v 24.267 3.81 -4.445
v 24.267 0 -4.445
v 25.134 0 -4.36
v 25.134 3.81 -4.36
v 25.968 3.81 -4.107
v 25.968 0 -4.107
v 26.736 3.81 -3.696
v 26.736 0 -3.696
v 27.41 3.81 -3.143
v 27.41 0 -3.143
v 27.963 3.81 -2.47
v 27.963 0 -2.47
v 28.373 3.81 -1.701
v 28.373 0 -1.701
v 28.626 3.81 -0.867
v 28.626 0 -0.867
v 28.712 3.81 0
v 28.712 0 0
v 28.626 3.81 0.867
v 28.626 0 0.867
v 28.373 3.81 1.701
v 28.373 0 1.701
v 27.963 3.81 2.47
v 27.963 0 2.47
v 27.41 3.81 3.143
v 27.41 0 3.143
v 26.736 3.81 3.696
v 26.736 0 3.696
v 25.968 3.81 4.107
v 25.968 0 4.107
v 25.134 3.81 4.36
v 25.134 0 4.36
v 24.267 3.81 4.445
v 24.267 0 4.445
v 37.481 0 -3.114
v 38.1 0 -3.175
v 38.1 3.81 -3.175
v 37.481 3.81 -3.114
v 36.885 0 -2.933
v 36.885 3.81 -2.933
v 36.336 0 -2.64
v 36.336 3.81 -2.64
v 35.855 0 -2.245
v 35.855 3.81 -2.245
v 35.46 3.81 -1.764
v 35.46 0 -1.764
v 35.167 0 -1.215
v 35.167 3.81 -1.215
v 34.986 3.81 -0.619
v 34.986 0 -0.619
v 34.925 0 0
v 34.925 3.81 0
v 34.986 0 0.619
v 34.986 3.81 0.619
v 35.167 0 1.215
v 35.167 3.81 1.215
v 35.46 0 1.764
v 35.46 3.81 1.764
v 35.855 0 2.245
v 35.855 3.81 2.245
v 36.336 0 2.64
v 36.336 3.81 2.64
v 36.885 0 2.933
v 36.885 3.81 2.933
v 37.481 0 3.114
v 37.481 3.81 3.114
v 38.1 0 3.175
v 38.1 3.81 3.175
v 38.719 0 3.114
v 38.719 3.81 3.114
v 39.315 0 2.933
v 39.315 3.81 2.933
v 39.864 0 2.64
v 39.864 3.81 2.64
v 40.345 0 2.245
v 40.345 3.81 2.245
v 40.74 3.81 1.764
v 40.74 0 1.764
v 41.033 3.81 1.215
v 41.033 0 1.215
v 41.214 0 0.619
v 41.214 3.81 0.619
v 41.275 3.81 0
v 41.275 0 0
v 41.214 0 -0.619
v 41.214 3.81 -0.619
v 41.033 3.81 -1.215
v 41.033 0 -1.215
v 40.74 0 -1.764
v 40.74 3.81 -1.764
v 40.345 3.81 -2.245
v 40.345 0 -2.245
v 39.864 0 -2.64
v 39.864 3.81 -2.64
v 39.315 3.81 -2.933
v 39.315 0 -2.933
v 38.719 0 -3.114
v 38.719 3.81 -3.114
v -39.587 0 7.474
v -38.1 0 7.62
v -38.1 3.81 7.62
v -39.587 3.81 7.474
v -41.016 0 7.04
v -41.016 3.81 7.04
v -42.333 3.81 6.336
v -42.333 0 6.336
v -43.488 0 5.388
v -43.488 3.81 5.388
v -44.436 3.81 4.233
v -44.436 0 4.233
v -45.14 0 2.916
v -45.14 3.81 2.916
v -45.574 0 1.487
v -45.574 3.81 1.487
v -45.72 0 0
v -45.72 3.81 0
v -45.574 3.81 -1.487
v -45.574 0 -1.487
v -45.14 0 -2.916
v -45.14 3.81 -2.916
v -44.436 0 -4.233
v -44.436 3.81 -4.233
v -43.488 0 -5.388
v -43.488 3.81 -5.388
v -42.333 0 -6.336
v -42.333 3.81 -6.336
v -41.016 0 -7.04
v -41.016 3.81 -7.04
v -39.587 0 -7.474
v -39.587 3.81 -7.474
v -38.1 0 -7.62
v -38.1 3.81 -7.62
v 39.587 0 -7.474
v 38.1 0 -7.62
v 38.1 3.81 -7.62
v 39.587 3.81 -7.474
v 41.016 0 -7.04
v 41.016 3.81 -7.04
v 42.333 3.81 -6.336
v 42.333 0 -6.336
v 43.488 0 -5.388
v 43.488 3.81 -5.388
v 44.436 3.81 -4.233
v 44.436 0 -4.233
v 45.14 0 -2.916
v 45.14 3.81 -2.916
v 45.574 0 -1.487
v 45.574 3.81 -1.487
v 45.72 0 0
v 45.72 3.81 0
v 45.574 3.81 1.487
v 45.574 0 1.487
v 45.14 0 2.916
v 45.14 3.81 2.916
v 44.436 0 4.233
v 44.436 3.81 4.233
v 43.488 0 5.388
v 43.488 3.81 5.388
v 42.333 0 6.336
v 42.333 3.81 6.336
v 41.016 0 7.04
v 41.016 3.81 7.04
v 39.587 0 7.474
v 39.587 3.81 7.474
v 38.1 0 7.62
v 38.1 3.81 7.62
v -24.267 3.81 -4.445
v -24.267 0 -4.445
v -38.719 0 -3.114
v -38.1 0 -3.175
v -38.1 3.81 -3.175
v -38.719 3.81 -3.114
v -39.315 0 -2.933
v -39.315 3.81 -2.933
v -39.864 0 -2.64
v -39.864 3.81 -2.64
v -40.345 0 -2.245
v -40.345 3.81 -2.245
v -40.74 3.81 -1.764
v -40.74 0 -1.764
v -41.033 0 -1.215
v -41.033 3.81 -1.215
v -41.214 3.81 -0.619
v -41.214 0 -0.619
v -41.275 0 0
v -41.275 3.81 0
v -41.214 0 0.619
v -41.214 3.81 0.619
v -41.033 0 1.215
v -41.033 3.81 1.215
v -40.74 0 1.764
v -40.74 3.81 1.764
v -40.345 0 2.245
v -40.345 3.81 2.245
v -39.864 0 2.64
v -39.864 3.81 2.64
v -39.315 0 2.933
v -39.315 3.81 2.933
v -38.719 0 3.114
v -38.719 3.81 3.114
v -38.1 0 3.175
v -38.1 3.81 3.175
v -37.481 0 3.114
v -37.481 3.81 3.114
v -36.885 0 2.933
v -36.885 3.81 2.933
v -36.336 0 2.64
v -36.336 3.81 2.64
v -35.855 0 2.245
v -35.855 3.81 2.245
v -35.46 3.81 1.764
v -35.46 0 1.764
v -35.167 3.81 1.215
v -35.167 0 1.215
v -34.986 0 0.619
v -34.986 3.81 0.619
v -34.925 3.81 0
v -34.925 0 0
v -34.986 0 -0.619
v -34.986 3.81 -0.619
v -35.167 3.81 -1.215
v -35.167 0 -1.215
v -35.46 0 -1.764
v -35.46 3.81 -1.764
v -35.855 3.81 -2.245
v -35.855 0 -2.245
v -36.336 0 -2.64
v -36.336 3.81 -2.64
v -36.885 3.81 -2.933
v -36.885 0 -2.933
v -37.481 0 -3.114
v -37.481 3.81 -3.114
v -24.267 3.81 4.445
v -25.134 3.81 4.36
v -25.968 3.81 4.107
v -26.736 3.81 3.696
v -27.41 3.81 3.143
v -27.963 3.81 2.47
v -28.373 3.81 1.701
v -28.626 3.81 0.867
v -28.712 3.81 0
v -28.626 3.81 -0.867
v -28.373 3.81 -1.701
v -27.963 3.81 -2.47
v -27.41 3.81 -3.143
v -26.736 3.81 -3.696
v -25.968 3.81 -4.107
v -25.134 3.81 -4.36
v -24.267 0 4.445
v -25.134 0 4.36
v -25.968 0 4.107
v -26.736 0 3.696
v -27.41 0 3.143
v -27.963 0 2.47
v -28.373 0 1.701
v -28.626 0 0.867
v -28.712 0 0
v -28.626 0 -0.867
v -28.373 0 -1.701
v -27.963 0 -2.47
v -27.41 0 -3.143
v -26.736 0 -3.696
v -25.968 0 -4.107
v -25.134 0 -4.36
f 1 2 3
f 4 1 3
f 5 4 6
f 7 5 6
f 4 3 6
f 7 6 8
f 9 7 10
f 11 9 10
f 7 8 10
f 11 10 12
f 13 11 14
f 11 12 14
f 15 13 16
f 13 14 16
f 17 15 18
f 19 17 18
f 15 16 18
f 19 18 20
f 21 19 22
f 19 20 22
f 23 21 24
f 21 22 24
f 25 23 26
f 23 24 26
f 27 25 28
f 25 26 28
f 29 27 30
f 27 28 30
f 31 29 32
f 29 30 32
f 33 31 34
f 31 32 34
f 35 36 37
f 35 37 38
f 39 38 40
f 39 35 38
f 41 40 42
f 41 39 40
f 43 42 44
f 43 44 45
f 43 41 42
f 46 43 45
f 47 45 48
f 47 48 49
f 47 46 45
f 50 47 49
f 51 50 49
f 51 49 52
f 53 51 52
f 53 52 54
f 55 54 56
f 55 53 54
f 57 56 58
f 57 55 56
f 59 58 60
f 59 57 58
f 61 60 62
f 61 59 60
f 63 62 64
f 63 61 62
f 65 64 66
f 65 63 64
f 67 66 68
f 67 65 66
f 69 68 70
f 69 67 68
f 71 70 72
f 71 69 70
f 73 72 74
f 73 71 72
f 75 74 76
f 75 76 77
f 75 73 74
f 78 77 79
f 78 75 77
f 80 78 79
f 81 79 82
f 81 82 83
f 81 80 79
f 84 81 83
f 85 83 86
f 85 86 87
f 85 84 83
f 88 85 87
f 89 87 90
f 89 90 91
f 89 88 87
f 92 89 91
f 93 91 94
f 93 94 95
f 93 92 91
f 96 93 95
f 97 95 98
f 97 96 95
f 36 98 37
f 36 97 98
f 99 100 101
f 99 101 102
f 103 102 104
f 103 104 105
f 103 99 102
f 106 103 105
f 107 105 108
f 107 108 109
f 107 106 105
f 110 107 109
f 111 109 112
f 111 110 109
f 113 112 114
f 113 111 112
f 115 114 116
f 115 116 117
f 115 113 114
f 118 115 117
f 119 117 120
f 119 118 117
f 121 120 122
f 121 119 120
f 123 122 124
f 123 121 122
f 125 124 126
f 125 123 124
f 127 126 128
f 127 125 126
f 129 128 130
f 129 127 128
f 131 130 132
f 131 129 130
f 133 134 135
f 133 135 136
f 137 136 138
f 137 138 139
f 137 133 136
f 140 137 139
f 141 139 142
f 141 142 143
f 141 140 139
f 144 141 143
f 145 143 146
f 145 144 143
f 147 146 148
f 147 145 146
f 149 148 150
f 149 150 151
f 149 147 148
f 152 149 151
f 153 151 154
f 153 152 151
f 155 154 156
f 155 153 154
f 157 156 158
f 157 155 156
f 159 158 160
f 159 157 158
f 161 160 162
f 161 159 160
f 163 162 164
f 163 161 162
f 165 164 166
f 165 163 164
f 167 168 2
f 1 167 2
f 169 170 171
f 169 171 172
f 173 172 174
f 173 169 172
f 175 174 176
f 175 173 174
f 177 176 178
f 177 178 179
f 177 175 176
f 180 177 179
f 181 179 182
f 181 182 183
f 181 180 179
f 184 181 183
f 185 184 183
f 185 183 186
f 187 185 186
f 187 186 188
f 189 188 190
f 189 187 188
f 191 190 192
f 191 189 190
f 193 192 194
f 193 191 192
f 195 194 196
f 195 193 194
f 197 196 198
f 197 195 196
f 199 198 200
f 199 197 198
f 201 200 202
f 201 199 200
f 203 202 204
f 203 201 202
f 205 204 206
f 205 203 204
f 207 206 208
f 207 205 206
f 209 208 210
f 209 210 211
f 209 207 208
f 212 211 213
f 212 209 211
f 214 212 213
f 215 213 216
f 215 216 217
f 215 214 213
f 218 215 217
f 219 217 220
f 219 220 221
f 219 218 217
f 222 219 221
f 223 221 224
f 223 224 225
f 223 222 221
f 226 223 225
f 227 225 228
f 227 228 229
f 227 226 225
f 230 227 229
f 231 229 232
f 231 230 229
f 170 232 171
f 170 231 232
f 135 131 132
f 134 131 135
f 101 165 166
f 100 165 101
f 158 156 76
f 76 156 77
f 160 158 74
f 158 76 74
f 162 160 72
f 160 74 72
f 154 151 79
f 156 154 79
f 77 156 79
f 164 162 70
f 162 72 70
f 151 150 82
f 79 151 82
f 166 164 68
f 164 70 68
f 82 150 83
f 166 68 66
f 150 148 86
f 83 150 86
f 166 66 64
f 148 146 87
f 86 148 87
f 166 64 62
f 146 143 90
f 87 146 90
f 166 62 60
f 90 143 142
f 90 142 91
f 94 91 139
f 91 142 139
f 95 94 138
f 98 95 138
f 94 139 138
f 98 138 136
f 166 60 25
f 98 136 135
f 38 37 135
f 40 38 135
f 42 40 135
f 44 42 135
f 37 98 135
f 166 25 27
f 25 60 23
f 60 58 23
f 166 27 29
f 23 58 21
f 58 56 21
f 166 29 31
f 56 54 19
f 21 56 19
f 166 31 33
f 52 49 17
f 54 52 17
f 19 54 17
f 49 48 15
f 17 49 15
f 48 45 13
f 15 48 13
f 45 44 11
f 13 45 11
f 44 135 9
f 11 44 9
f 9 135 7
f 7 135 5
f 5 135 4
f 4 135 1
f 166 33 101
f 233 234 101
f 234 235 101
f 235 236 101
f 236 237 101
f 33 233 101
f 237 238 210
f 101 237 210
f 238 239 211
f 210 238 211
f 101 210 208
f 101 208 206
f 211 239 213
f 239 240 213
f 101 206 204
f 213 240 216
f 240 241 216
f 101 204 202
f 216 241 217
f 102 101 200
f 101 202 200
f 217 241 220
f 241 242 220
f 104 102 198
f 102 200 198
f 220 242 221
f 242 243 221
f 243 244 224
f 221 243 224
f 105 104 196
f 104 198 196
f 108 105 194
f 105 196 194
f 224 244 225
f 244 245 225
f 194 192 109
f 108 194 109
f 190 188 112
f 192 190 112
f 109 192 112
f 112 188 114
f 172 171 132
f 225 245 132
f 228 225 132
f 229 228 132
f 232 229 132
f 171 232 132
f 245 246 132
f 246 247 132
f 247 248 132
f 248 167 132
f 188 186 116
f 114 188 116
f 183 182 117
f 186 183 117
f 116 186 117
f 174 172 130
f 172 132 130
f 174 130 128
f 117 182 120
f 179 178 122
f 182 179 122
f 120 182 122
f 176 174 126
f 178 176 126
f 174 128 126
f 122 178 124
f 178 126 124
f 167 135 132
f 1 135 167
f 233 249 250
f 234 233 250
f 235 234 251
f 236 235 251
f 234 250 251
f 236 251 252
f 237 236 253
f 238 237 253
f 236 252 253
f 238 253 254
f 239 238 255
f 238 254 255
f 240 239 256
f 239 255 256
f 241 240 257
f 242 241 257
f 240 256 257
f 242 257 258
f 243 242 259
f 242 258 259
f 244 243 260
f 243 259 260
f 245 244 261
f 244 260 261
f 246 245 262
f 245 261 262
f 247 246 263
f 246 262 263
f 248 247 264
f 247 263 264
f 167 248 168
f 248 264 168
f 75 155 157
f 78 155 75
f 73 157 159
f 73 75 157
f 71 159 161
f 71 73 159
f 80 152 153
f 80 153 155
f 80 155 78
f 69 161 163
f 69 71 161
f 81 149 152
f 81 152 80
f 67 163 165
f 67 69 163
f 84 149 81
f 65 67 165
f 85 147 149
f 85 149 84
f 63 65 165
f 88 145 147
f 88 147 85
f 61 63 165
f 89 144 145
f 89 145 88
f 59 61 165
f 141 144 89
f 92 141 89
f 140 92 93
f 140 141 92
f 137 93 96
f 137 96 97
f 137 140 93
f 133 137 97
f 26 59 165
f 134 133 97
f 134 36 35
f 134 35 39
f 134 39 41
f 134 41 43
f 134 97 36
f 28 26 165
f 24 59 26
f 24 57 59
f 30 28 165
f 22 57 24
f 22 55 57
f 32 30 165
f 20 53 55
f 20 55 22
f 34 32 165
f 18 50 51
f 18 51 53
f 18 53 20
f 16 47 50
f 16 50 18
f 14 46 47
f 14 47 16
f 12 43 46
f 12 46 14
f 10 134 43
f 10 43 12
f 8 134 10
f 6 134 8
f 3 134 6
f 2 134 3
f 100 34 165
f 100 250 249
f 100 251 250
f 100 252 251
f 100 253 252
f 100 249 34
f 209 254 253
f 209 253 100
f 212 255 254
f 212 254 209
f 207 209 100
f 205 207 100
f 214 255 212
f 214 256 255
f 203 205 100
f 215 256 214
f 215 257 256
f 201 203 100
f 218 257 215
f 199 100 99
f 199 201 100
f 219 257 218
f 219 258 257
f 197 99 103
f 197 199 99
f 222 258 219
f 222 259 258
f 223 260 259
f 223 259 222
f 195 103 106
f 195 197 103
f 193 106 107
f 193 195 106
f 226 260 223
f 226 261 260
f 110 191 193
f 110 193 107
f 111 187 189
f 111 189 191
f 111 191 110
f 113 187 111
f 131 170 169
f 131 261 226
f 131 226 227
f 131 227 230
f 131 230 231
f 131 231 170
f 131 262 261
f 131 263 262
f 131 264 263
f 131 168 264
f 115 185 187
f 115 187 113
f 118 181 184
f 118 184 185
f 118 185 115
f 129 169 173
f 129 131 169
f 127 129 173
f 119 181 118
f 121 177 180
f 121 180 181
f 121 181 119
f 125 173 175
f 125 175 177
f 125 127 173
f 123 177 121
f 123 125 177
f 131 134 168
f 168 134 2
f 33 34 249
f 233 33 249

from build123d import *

# Parameters (mm, degrees)
SKETCH1_R           = 3.175
BOSS_EXTRUDE5_DEPTH = 3.81


with BuildPart() as part:
    # Sketch1 → Boss-Extrude5 (new body)
    with BuildSketch(Plane(origin=(0, 0, 0), x_dir=(1, 0, 0), z_dir=(0, 1, 0))):
        with BuildLine():
            Line((38.1, -7.62), (-38.1, -7.62))
            ThreePointArc((-38.1, -7.62), (-45.72, 0), (-38.1, 7.62))
            Line((-38.1, 7.62), (38.1, 7.62))
            ThreePointArc((38.1, 7.62), (45.72, 0), (38.1, -7.62))
        make_face()
        with Locations(Location((-38.1, 0, 0), (0, 0, 90))):
            Circle(SKETCH1_R, mode=Mode.SUBTRACT)
        with Locations(Location((38.1, 0, 0), (0, 0, 90))):
            Circle(SKETCH1_R, mode=Mode.SUBTRACT)
        with BuildLine():
            Line((-24.266853823, 4.445), (24.266853823, 4.445))
            ThreePointArc((24.266853823, 4.445), (28.711853823, 0), (24.266853823, -4.445))
            Line((24.266853823, -4.445), (-24.266853823, -4.445))
            ThreePointArc((-24.266853823, -4.445), (-28.711853823, 0), (-24.266853823, 4.445))
        make_face(mode=Mode.SUBTRACT)
    extrude(amount=BOSS_EXTRUDE5_DEPTH)


solid = part.part
